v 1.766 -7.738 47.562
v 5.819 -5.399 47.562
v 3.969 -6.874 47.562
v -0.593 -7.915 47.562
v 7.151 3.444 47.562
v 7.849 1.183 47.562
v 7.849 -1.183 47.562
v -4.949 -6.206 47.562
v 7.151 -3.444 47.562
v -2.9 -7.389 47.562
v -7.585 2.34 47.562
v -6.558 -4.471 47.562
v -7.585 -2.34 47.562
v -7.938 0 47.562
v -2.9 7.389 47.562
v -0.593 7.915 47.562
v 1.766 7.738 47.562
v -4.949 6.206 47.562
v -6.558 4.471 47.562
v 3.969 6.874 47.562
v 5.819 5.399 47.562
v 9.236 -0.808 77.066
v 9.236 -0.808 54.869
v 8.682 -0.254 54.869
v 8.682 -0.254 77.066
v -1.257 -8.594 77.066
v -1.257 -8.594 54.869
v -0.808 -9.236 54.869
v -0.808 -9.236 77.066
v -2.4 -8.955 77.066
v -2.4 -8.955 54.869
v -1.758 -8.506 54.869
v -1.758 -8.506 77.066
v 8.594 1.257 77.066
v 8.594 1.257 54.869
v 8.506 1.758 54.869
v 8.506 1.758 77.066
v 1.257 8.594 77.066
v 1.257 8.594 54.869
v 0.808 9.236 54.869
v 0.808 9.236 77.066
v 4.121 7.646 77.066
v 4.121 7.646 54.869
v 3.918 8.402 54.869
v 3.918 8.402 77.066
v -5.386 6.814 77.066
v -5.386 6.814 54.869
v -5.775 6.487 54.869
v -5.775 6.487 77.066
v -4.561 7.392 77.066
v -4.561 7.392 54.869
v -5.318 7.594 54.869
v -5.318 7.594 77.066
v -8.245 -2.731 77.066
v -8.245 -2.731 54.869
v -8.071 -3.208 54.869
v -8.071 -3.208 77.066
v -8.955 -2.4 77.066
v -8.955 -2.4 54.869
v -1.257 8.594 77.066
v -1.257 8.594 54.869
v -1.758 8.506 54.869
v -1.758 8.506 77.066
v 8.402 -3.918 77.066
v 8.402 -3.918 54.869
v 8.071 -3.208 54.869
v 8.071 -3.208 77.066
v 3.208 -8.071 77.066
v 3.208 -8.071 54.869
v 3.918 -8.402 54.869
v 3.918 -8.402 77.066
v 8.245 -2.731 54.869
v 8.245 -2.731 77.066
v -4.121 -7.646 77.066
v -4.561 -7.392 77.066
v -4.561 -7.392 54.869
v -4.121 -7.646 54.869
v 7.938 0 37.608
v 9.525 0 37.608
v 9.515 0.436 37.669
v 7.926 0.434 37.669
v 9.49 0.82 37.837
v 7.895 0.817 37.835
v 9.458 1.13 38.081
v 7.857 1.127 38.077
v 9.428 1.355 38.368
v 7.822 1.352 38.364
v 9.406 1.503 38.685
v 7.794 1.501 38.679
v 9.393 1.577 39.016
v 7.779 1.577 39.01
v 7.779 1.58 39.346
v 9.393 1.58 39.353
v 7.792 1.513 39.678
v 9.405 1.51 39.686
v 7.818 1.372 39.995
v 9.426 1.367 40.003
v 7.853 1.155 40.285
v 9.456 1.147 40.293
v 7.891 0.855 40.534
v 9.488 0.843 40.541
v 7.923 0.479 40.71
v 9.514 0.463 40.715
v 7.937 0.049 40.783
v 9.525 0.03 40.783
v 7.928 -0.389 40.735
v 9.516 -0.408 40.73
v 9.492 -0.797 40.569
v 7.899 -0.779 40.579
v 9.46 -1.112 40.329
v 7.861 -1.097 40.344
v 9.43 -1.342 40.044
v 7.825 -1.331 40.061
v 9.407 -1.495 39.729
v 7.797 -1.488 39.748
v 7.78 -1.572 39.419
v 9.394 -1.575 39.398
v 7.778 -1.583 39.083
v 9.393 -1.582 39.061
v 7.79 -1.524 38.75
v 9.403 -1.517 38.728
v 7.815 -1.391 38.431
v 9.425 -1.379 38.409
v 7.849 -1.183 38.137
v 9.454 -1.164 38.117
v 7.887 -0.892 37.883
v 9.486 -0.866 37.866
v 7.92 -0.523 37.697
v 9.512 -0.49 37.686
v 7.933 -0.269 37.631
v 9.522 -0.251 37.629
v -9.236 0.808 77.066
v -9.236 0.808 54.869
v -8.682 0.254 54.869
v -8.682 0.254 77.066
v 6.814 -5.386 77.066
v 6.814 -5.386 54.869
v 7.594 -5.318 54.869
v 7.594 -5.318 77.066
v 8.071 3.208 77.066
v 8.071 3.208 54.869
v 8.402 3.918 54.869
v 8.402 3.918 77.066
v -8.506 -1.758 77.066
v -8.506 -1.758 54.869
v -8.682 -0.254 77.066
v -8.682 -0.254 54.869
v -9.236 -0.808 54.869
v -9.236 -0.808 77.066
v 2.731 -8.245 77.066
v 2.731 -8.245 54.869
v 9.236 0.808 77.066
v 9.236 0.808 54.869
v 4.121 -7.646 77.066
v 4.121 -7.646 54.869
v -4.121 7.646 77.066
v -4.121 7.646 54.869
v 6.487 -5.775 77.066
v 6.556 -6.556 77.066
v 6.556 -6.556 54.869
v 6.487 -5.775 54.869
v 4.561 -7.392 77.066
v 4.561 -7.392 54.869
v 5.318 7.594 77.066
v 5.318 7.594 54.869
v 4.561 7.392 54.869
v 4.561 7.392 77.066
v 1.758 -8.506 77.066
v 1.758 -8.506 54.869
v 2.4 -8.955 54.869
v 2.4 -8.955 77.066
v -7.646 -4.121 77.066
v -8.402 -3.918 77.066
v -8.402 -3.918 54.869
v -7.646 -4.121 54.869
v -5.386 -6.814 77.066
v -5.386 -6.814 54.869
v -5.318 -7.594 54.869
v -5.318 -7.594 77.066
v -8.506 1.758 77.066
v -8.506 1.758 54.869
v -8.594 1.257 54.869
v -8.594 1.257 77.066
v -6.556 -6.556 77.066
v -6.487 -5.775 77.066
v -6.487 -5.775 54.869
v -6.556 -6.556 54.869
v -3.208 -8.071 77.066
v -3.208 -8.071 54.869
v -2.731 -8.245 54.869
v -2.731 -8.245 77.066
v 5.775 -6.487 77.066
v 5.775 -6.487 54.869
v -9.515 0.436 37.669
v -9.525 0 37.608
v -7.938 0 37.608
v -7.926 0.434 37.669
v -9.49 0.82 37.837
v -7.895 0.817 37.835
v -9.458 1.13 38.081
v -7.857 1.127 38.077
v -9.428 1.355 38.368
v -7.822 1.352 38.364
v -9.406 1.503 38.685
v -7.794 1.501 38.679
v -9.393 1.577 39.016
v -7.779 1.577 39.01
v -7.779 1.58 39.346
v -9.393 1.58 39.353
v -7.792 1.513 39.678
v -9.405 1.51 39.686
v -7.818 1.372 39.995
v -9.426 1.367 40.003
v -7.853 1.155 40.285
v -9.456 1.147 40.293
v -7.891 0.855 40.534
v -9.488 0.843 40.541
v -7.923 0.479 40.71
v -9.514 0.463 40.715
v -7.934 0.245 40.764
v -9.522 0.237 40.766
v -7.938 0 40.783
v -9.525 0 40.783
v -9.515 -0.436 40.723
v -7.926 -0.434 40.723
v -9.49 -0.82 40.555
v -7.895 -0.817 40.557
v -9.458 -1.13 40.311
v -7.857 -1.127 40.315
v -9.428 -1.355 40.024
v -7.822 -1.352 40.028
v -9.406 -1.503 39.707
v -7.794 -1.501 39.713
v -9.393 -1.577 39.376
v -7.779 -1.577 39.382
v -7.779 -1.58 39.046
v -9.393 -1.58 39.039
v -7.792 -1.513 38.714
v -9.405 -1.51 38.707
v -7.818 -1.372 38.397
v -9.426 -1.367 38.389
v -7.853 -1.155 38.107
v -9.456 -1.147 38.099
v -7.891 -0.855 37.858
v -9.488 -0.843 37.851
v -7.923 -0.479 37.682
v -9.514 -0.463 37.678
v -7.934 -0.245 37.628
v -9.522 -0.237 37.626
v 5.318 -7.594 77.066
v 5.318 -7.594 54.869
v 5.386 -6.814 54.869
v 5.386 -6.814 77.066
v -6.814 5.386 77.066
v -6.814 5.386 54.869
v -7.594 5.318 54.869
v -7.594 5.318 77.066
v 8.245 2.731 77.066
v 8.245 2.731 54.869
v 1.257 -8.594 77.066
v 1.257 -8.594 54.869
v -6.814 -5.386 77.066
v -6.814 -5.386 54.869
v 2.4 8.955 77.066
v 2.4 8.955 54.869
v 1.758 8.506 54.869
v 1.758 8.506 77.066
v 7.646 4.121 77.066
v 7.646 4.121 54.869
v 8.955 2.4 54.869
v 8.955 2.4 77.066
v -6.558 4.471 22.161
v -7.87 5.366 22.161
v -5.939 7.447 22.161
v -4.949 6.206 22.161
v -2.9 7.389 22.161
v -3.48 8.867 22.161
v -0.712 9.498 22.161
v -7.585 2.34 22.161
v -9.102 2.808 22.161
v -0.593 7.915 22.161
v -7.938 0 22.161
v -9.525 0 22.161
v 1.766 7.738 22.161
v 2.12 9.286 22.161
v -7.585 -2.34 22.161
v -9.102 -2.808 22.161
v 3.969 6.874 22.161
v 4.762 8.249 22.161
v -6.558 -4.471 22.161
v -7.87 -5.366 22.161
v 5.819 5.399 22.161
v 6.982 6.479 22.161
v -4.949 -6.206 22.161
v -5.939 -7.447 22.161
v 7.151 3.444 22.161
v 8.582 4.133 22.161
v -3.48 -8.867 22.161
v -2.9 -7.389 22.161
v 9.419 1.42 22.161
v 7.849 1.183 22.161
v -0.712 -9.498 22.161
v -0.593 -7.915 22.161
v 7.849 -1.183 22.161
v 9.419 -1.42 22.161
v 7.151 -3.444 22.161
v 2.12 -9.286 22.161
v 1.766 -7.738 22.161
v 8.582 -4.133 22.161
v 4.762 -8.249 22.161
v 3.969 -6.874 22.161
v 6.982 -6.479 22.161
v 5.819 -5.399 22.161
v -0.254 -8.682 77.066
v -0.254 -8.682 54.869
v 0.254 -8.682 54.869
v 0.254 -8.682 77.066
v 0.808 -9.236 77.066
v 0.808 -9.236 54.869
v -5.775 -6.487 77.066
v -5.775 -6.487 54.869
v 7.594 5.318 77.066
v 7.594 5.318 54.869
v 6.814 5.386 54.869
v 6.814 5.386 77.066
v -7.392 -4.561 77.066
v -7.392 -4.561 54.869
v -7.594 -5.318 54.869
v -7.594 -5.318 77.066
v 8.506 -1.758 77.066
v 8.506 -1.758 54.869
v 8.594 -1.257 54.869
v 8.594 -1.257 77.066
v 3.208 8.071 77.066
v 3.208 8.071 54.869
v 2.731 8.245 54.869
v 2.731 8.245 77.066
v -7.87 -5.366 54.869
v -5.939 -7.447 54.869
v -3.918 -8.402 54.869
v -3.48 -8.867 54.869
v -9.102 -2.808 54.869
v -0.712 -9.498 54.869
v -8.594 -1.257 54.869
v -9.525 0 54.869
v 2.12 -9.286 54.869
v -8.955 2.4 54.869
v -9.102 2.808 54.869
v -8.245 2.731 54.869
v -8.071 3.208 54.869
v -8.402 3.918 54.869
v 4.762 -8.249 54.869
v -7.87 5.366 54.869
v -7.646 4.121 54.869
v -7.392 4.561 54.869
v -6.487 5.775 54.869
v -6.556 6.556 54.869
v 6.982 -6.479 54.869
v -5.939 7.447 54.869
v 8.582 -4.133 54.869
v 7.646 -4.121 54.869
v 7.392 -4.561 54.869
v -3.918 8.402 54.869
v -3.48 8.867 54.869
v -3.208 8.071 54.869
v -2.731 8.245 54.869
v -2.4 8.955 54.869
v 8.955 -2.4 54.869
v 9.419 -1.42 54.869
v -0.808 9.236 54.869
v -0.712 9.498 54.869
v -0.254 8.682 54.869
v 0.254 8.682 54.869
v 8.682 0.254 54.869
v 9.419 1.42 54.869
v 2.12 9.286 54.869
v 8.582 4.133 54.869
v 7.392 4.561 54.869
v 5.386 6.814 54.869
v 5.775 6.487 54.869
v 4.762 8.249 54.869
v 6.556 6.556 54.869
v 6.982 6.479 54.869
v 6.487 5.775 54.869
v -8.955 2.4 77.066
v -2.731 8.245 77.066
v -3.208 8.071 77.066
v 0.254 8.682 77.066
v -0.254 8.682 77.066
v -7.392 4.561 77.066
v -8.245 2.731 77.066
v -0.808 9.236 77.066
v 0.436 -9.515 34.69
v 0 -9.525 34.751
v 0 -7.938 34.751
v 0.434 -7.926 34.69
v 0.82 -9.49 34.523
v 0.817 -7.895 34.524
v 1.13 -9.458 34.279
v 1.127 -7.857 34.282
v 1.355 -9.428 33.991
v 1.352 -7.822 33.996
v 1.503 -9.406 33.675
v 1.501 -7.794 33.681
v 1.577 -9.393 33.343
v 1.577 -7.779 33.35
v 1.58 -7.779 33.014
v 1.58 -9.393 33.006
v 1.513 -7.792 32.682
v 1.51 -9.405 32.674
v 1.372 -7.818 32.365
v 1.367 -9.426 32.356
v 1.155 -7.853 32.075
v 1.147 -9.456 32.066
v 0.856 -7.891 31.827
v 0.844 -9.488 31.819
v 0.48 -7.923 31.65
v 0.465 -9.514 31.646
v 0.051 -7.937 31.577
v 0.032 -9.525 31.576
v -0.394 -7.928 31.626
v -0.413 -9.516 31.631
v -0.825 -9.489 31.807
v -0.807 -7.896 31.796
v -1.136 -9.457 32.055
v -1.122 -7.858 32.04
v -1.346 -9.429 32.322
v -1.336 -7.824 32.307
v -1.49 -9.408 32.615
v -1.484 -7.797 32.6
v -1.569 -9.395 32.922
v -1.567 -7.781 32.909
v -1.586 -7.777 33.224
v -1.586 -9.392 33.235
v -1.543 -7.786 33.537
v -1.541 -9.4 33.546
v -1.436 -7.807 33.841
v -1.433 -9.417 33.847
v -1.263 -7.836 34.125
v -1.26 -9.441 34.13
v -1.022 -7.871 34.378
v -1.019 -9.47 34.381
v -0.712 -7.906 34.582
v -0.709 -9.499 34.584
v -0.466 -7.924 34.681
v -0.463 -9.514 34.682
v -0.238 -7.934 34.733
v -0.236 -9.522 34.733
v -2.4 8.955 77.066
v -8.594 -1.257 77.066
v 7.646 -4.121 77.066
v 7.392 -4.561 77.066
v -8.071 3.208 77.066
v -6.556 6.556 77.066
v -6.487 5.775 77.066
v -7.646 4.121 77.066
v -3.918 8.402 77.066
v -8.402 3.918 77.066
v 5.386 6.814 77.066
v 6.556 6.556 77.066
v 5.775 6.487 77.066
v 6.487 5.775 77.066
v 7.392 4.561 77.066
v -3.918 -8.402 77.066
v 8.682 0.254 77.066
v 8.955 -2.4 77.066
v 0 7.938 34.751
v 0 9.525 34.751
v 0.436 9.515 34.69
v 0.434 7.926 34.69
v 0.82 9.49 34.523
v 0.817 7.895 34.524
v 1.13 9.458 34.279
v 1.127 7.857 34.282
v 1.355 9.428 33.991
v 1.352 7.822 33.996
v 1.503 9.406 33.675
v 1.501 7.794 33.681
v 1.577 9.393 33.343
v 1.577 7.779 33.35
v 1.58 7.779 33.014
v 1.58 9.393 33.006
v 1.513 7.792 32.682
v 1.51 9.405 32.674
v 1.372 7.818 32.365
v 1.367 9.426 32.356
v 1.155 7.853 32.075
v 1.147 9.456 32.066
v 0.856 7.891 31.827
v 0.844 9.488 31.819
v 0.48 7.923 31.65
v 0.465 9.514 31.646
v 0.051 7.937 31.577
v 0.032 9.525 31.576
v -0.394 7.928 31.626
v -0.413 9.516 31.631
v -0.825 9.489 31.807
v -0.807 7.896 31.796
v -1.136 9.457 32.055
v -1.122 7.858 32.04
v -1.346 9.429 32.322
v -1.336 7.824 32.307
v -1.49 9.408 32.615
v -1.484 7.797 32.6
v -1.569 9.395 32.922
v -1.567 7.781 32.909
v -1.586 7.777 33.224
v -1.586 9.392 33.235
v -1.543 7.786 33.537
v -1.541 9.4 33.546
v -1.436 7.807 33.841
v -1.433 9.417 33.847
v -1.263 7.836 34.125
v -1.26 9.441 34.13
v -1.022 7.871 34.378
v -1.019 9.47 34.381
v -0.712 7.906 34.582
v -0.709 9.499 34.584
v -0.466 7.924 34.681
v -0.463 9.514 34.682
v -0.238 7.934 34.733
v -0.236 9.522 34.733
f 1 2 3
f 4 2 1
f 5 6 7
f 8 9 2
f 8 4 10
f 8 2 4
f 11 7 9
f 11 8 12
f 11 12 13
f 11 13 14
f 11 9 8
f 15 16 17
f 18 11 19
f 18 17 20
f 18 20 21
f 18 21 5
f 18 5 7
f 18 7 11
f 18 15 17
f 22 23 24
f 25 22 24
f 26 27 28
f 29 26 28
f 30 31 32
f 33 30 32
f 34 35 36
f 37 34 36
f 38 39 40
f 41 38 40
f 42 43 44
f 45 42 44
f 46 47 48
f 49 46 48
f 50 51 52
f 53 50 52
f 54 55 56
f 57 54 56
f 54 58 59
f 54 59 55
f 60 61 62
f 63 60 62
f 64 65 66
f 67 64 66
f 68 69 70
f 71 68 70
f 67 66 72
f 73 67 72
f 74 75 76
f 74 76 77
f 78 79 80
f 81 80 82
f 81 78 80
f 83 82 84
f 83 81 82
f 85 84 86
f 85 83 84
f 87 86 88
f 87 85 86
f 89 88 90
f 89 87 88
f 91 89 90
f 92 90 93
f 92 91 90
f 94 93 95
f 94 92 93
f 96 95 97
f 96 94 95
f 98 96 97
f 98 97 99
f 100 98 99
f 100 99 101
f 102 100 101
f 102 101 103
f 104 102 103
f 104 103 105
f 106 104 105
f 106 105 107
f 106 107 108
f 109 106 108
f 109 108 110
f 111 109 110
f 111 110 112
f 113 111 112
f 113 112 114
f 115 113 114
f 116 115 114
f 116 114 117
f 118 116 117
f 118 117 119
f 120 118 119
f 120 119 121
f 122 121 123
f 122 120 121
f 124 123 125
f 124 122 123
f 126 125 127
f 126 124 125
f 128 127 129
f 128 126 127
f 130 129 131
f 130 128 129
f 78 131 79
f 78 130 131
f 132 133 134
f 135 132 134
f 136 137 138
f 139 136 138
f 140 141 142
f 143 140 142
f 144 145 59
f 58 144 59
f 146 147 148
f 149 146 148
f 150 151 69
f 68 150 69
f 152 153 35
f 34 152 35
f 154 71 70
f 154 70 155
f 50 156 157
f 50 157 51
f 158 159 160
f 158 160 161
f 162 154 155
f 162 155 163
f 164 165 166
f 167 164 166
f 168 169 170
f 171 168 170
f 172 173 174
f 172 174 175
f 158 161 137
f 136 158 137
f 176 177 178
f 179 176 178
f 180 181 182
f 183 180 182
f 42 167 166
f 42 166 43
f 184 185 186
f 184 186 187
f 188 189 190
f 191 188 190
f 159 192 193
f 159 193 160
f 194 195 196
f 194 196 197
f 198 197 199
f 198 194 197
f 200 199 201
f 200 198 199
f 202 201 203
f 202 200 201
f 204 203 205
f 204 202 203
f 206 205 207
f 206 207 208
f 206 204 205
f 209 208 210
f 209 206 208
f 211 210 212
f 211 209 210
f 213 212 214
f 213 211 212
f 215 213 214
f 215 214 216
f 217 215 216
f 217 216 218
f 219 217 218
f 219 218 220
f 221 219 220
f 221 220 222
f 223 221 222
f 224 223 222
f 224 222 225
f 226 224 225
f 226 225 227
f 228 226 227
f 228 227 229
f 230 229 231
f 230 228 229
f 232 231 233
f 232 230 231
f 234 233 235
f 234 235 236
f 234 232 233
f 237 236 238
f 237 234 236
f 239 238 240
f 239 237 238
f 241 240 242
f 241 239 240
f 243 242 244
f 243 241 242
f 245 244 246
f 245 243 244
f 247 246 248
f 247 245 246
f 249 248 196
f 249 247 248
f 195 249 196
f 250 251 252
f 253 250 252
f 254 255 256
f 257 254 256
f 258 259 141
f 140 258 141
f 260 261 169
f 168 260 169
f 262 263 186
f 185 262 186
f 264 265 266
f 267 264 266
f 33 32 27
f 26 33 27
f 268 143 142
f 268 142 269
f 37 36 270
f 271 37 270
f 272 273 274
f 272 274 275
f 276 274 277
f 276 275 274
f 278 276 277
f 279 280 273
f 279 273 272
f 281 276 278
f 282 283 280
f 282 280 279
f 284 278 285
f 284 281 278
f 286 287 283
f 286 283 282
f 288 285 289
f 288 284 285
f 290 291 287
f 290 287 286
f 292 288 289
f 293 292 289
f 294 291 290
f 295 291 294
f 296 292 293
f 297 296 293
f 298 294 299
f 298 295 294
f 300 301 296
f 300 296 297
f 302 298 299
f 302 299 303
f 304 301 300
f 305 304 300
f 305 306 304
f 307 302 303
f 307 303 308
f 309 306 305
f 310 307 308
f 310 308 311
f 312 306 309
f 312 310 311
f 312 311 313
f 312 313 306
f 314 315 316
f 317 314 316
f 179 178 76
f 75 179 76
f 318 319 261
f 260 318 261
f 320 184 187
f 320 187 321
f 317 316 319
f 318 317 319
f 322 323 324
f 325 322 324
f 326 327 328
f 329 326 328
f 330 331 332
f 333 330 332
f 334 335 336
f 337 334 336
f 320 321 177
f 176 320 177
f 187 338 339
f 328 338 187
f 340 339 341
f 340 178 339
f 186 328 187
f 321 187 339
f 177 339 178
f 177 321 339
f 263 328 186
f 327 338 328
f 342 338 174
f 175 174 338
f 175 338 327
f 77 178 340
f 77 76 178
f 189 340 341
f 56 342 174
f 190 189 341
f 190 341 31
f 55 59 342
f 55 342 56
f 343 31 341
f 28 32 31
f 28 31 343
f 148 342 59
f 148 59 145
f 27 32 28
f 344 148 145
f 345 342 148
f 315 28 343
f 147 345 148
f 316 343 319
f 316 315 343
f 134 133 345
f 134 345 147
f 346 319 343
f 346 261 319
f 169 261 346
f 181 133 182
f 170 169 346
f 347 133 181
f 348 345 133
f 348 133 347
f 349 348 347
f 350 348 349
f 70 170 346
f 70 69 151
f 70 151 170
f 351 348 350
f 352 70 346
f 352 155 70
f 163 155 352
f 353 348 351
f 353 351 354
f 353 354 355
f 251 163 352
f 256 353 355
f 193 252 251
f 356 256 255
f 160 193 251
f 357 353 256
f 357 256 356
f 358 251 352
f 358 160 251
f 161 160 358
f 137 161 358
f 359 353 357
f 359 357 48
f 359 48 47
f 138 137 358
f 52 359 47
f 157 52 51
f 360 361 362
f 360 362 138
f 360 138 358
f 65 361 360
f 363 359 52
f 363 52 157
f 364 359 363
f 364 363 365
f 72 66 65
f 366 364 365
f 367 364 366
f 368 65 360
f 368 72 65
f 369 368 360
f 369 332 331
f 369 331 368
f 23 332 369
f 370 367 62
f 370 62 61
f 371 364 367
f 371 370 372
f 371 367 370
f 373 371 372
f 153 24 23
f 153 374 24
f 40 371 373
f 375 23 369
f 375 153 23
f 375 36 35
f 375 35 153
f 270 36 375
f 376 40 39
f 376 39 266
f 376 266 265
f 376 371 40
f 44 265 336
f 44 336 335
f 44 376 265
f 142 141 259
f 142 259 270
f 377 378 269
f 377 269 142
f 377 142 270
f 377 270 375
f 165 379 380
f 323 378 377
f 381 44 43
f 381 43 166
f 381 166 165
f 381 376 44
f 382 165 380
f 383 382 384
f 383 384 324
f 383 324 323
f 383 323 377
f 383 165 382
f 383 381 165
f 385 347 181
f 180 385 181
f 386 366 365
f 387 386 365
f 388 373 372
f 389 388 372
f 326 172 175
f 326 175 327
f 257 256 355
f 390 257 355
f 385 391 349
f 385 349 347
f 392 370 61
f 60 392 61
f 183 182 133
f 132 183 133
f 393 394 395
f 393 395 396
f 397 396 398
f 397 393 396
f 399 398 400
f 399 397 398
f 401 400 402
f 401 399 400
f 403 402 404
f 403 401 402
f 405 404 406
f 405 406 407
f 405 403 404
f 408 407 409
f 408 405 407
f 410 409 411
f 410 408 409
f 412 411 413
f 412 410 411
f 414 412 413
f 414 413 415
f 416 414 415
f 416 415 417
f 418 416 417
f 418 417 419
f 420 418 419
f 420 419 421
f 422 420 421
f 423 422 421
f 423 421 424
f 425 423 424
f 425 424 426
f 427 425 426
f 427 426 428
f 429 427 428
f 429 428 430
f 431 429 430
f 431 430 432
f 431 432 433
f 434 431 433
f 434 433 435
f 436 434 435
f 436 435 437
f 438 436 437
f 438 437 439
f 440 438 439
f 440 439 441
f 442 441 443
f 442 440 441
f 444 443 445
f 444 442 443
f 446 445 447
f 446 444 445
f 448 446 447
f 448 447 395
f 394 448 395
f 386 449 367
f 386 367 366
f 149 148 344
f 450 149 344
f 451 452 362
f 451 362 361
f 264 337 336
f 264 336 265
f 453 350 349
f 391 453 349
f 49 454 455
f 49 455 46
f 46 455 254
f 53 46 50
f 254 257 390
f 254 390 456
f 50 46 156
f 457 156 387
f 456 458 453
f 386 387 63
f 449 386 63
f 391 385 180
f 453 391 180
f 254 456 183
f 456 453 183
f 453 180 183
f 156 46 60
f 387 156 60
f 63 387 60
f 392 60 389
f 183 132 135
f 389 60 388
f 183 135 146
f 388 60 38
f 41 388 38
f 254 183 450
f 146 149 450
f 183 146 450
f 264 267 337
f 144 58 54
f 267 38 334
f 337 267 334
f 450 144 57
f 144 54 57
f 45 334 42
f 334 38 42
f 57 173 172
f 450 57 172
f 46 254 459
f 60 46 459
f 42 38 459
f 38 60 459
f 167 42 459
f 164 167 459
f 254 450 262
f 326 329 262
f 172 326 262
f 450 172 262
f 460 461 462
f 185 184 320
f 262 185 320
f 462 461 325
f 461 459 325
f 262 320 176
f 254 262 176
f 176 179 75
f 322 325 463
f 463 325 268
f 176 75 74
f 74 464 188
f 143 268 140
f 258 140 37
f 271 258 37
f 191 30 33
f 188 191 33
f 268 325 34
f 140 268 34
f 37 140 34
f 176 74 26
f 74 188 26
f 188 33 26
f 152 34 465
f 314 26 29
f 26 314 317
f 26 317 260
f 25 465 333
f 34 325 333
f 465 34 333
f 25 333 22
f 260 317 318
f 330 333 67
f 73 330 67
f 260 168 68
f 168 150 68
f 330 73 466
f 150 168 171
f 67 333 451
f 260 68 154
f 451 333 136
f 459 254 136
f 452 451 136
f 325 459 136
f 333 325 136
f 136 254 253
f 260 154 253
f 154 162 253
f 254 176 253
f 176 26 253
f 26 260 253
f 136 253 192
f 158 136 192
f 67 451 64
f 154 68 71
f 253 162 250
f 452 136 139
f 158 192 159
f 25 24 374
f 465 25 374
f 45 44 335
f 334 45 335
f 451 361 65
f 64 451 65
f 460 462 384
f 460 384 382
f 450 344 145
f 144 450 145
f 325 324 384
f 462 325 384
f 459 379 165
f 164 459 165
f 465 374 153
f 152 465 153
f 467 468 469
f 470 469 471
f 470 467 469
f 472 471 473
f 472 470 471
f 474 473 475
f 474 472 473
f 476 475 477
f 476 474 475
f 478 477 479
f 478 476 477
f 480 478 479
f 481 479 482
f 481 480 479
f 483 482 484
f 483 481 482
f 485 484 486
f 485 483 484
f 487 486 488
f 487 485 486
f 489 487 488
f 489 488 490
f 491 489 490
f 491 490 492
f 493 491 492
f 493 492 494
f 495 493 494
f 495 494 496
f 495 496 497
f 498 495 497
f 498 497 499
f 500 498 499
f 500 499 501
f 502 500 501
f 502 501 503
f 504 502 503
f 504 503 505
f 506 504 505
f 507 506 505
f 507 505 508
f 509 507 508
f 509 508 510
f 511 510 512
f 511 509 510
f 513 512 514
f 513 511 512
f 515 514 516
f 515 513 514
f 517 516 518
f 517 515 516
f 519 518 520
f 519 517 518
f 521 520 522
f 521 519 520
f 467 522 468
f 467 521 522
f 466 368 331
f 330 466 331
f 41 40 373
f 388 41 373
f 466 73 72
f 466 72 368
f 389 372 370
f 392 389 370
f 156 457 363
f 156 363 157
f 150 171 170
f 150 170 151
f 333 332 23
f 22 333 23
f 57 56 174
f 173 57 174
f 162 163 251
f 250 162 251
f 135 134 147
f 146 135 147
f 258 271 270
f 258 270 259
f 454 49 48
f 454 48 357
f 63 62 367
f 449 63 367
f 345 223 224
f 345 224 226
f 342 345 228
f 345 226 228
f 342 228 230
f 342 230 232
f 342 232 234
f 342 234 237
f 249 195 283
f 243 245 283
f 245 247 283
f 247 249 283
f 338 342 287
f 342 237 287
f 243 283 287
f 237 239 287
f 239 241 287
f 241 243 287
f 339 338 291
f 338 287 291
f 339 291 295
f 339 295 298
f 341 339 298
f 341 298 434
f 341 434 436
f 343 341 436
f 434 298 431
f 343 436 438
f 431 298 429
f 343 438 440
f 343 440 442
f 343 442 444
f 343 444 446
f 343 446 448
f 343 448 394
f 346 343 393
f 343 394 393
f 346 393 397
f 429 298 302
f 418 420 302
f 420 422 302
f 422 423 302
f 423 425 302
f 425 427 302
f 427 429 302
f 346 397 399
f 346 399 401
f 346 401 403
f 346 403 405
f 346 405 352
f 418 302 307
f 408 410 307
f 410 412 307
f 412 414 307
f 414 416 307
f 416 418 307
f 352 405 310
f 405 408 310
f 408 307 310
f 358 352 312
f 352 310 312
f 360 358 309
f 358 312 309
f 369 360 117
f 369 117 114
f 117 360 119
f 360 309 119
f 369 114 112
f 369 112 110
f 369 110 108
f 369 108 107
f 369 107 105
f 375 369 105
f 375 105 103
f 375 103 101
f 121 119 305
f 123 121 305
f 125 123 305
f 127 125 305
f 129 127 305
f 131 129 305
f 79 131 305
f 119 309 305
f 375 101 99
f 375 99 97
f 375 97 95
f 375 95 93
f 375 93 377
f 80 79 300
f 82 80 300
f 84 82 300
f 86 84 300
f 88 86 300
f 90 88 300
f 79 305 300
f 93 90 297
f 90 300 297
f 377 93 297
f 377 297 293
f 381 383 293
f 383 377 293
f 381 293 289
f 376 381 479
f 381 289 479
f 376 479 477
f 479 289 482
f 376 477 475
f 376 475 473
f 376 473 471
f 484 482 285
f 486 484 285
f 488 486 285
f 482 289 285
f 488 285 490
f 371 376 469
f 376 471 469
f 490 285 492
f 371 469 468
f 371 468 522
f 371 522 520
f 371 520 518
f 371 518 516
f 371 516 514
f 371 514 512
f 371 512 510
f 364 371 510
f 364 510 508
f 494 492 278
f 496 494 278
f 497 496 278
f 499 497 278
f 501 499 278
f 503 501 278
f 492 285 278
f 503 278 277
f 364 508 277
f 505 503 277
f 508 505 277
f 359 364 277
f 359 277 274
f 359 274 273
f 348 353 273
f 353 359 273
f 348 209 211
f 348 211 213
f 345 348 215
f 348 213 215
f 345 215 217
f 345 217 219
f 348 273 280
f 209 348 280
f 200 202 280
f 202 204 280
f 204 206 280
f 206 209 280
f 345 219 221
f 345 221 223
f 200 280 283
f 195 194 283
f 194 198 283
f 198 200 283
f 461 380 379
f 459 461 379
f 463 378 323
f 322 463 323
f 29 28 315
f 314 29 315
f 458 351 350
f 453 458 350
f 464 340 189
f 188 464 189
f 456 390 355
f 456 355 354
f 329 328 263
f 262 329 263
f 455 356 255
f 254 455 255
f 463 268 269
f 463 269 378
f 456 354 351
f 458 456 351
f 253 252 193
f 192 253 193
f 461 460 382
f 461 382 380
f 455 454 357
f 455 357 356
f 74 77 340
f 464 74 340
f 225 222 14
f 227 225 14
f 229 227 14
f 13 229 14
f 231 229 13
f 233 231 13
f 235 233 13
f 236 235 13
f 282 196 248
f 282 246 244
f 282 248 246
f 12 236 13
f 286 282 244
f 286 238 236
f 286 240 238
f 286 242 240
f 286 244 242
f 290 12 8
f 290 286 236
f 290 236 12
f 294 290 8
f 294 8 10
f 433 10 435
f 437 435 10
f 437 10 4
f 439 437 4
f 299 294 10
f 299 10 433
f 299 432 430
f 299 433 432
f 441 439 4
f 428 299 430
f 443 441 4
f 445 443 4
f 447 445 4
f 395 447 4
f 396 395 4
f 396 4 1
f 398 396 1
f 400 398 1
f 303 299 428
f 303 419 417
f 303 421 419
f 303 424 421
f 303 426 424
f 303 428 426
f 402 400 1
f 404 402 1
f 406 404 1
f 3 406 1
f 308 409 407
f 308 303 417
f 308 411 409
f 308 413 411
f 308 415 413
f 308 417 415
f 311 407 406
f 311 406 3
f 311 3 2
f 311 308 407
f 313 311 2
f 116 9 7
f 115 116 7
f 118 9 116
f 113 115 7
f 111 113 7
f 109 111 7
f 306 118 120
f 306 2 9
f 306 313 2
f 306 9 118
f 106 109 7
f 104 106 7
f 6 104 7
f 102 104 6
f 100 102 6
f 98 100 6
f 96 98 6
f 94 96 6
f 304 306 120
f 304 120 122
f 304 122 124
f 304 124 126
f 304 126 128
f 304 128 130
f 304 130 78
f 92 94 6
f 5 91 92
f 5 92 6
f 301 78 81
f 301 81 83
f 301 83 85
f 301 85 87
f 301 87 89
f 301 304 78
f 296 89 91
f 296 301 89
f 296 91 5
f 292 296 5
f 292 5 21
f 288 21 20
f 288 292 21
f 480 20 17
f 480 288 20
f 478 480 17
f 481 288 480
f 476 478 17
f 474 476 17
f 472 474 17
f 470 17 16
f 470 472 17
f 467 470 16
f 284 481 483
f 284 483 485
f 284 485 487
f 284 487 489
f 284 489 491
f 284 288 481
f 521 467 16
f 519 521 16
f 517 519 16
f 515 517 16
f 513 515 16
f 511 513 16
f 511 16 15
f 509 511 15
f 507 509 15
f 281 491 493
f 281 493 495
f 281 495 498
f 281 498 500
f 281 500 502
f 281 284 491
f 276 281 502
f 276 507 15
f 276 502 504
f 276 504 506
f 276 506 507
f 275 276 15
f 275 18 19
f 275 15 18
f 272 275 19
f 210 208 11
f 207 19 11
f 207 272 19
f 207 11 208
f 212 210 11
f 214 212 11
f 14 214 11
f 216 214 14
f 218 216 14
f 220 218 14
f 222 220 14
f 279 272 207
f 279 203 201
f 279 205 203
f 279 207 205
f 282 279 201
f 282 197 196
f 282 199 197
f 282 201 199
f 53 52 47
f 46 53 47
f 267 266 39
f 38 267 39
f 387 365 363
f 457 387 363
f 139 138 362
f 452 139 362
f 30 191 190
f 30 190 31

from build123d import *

# Parameters (mm, degrees)
SKETCH5_W               = 1.587499994
SKETCH5_H               = 54.90464
CUT_EXTRUDE5_DEPTH      = 79.234526804
CUT_EXTRUDE5_DEPTH_BACK = 79.234526804
SKETCH7_R               = 1.5875
CUT_EXTRUDE6_DEPTH      = 79.234526927
CUT_EXTRUDE6_DEPTH_BACK = 79.234526927
SKETCH6_R               = 1.5875
SKETCH10_R              = 7.9375
BOSS_EXTRUDE1_DEPTH     = 29.50464
CUT_EXTRUDE7_START      = 54.86908
SKETCH8_R               = 12.7
CUT_EXTRUDE7_DEPTH      = 25.4


with BuildPart() as part:
    # Sketch5 → Revolve2 (revolve)
    with BuildSketch(Plane(origin=(0, 0, 0), x_dir=(1, 0, 0), z_dir=(0, 1, 0)), mode=Mode.PRIVATE) as revolve2_sk:
        with Locations((8.731249997, -49.61382)):
            Rectangle(SKETCH5_W, SKETCH5_H)
    revolve(revolve2_sk.sketch.rotate(Axis((0, 0, 0), (0, 0, 1)), 180), axis=Axis((0, 0, 0), (0, 0, 1)))

    # Sketch7 → Cut-Extrude5 (cut, two sides: drawn at the far end of the back side and taken through both)
    with BuildSketch(Plane(origin=(0, 0, 0), x_dir=(0, 0, -1), z_dir=(1, 0, 0)).offset(-CUT_EXTRUDE5_DEPTH_BACK)):
        with Locations((-39.195999993, 0)):
            Circle(SKETCH7_R)
    extrude(amount=CUT_EXTRUDE5_DEPTH + CUT_EXTRUDE5_DEPTH_BACK, mode=Mode.SUBTRACT)

    # Sketch6 → Cut-Extrude6 (cut, two sides: drawn at the far end of the back side and taken through both)
    with BuildSketch(Plane(origin=(0, 0, 0), x_dir=(1, 0, 0), z_dir=(0, 1, 0)).offset(-CUT_EXTRUDE6_DEPTH_BACK)):
        with Locations(Location((1e-09, -33.163499999, 0), (0, 0, 269.999999955))):
            Circle(SKETCH6_R)
    extrude(amount=CUT_EXTRUDE6_DEPTH + CUT_EXTRUDE6_DEPTH_BACK, mode=Mode.SUBTRACT)

    # Sketch10 → Boss-Extrude1 (add)
    with BuildSketch(Plane(origin=(0, 0, 47.5615), x_dir=(-1, 0, 0), z_dir=(0, 0, -1))):
        Circle(SKETCH10_R)
    extrude(amount=-BOSS_EXTRUDE1_DEPTH)

    # Sketch8 → Cut-Extrude7 (cut)
    with BuildSketch(Plane.XY.offset(CUT_EXTRUDE7_START)):
        Circle(SKETCH8_R)
        Polygon((9.235721046, -0.808020891), (8.681700155, -0.254), (8.681700155, 0.254), (9.235721046, 0.808020891), (8.593912259, 1.257420242), (8.505698985, 1.75770258), (8.955098336, 2.399511367), (8.245002688, 2.730634406), (8.071256455, 3.207998257), (8.402379494, 3.918093905), (7.645572882, 4.120879625), (7.391572882, 4.56082053), (7.594358603, 5.317627141), (6.813836213, 5.385914002), (6.487300108, 5.775064579), (6.555586968, 6.555586968), (5.775064579, 6.487300108), (5.385914002, 6.813836213), (5.317627141, 7.594358603), (4.56082053, 7.391572882), (4.120879625, 7.645572882), (3.918093905, 8.402379494), (3.207998257, 8.071256455), (2.730634406, 8.245002688), (2.399511367, 8.955098336), (1.75770258, 8.505698985), (1.257420242, 8.593912259), (0.808020891, 9.235721046), (0.254, 8.681700155), (-0.254, 8.681700155), (-0.808020891, 9.235721046), (-1.257420242, 8.593912259), (-1.75770258, 8.505698985), (-2.399511367, 8.955098336), (-2.730634406, 8.245002688), (-3.207998257, 8.071256455), (-3.918093905, 8.402379494), (-4.120879625, 7.645572882), (-4.56082053, 7.391572882), (-5.317627141, 7.594358603), (-5.385914002, 6.813836213), (-5.775064579, 6.487300108), (-6.555586968, 6.555586968), (-6.487300108, 5.775064579), (-6.813836213, 5.385914002), (-7.594358603, 5.317627141), (-7.391572882, 4.56082053), (-7.645572882, 4.120879625), (-8.402379494, 3.918093905), (-8.071256455, 3.207998257), (-8.245002688, 2.730634406), (-8.955098336, 2.399511367), (-8.505698985, 1.75770258), (-8.593912259, 1.257420242), (-9.235721046, 0.808020891), (-8.681700155, 0.254), (-8.681700155, -0.254), (-9.235721046, -0.808020891), (-8.593912259, -1.257420242), (-8.505698985, -1.75770258), (-8.955098336, -2.399511367), (-8.245002688, -2.730634406), (-8.071256455, -3.207998257), (-8.402379494, -3.918093905), (-7.645572882, -4.120879625), (-7.391572882, -4.56082053), (-7.594358603, -5.317627141), (-6.813836213, -5.385914002), (-6.487300108, -5.775064579), (-6.555586968, -6.555586968), (-5.775064579, -6.487300108), (-5.385914002, -6.813836213), (-5.317627141, -7.594358603), (-4.56082053, -7.391572882), (-4.120879625, -7.645572882), (-3.918093905, -8.402379494), (-3.207998257, -8.071256455), (-2.730634406, -8.245002688), (-2.399511367, -8.955098336), (-1.75770258, -8.505698985), (-1.257420242, -8.593912259), (-0.808020891, -9.235721046), (-0.254, -8.681700155), (0.254, -8.681700155), (0.808020891, -9.235721046), (1.257420242, -8.593912259), (1.75770258, -8.505698985), (2.399511367, -8.955098336), (2.730634406, -8.245002688), (3.207998257, -8.071256455), (3.918093905, -8.402379494), (4.120879625, -7.645572882), (4.56082053, -7.391572882), (5.317627141, -7.594358603), (5.385914002, -6.813836213), (5.775064579, -6.487300108), (6.555586968, -6.555586968), (6.487300108, -5.775064579), (6.813836213, -5.385914002), (7.594358603, -5.317627141), (7.391572882, -4.56082053), (7.645572882, -4.120879625), (8.402379494, -3.918093905), (8.071256455, -3.207998257), (8.245002688, -2.730634406), (8.955098336, -2.399511367), (8.505698985, -1.75770258), (8.593912259, -1.257420242), align=None, mode=Mode.SUBTRACT)
    extrude(amount=CUT_EXTRUDE7_DEPTH, mode=Mode.SUBTRACT)


solid = part.part
